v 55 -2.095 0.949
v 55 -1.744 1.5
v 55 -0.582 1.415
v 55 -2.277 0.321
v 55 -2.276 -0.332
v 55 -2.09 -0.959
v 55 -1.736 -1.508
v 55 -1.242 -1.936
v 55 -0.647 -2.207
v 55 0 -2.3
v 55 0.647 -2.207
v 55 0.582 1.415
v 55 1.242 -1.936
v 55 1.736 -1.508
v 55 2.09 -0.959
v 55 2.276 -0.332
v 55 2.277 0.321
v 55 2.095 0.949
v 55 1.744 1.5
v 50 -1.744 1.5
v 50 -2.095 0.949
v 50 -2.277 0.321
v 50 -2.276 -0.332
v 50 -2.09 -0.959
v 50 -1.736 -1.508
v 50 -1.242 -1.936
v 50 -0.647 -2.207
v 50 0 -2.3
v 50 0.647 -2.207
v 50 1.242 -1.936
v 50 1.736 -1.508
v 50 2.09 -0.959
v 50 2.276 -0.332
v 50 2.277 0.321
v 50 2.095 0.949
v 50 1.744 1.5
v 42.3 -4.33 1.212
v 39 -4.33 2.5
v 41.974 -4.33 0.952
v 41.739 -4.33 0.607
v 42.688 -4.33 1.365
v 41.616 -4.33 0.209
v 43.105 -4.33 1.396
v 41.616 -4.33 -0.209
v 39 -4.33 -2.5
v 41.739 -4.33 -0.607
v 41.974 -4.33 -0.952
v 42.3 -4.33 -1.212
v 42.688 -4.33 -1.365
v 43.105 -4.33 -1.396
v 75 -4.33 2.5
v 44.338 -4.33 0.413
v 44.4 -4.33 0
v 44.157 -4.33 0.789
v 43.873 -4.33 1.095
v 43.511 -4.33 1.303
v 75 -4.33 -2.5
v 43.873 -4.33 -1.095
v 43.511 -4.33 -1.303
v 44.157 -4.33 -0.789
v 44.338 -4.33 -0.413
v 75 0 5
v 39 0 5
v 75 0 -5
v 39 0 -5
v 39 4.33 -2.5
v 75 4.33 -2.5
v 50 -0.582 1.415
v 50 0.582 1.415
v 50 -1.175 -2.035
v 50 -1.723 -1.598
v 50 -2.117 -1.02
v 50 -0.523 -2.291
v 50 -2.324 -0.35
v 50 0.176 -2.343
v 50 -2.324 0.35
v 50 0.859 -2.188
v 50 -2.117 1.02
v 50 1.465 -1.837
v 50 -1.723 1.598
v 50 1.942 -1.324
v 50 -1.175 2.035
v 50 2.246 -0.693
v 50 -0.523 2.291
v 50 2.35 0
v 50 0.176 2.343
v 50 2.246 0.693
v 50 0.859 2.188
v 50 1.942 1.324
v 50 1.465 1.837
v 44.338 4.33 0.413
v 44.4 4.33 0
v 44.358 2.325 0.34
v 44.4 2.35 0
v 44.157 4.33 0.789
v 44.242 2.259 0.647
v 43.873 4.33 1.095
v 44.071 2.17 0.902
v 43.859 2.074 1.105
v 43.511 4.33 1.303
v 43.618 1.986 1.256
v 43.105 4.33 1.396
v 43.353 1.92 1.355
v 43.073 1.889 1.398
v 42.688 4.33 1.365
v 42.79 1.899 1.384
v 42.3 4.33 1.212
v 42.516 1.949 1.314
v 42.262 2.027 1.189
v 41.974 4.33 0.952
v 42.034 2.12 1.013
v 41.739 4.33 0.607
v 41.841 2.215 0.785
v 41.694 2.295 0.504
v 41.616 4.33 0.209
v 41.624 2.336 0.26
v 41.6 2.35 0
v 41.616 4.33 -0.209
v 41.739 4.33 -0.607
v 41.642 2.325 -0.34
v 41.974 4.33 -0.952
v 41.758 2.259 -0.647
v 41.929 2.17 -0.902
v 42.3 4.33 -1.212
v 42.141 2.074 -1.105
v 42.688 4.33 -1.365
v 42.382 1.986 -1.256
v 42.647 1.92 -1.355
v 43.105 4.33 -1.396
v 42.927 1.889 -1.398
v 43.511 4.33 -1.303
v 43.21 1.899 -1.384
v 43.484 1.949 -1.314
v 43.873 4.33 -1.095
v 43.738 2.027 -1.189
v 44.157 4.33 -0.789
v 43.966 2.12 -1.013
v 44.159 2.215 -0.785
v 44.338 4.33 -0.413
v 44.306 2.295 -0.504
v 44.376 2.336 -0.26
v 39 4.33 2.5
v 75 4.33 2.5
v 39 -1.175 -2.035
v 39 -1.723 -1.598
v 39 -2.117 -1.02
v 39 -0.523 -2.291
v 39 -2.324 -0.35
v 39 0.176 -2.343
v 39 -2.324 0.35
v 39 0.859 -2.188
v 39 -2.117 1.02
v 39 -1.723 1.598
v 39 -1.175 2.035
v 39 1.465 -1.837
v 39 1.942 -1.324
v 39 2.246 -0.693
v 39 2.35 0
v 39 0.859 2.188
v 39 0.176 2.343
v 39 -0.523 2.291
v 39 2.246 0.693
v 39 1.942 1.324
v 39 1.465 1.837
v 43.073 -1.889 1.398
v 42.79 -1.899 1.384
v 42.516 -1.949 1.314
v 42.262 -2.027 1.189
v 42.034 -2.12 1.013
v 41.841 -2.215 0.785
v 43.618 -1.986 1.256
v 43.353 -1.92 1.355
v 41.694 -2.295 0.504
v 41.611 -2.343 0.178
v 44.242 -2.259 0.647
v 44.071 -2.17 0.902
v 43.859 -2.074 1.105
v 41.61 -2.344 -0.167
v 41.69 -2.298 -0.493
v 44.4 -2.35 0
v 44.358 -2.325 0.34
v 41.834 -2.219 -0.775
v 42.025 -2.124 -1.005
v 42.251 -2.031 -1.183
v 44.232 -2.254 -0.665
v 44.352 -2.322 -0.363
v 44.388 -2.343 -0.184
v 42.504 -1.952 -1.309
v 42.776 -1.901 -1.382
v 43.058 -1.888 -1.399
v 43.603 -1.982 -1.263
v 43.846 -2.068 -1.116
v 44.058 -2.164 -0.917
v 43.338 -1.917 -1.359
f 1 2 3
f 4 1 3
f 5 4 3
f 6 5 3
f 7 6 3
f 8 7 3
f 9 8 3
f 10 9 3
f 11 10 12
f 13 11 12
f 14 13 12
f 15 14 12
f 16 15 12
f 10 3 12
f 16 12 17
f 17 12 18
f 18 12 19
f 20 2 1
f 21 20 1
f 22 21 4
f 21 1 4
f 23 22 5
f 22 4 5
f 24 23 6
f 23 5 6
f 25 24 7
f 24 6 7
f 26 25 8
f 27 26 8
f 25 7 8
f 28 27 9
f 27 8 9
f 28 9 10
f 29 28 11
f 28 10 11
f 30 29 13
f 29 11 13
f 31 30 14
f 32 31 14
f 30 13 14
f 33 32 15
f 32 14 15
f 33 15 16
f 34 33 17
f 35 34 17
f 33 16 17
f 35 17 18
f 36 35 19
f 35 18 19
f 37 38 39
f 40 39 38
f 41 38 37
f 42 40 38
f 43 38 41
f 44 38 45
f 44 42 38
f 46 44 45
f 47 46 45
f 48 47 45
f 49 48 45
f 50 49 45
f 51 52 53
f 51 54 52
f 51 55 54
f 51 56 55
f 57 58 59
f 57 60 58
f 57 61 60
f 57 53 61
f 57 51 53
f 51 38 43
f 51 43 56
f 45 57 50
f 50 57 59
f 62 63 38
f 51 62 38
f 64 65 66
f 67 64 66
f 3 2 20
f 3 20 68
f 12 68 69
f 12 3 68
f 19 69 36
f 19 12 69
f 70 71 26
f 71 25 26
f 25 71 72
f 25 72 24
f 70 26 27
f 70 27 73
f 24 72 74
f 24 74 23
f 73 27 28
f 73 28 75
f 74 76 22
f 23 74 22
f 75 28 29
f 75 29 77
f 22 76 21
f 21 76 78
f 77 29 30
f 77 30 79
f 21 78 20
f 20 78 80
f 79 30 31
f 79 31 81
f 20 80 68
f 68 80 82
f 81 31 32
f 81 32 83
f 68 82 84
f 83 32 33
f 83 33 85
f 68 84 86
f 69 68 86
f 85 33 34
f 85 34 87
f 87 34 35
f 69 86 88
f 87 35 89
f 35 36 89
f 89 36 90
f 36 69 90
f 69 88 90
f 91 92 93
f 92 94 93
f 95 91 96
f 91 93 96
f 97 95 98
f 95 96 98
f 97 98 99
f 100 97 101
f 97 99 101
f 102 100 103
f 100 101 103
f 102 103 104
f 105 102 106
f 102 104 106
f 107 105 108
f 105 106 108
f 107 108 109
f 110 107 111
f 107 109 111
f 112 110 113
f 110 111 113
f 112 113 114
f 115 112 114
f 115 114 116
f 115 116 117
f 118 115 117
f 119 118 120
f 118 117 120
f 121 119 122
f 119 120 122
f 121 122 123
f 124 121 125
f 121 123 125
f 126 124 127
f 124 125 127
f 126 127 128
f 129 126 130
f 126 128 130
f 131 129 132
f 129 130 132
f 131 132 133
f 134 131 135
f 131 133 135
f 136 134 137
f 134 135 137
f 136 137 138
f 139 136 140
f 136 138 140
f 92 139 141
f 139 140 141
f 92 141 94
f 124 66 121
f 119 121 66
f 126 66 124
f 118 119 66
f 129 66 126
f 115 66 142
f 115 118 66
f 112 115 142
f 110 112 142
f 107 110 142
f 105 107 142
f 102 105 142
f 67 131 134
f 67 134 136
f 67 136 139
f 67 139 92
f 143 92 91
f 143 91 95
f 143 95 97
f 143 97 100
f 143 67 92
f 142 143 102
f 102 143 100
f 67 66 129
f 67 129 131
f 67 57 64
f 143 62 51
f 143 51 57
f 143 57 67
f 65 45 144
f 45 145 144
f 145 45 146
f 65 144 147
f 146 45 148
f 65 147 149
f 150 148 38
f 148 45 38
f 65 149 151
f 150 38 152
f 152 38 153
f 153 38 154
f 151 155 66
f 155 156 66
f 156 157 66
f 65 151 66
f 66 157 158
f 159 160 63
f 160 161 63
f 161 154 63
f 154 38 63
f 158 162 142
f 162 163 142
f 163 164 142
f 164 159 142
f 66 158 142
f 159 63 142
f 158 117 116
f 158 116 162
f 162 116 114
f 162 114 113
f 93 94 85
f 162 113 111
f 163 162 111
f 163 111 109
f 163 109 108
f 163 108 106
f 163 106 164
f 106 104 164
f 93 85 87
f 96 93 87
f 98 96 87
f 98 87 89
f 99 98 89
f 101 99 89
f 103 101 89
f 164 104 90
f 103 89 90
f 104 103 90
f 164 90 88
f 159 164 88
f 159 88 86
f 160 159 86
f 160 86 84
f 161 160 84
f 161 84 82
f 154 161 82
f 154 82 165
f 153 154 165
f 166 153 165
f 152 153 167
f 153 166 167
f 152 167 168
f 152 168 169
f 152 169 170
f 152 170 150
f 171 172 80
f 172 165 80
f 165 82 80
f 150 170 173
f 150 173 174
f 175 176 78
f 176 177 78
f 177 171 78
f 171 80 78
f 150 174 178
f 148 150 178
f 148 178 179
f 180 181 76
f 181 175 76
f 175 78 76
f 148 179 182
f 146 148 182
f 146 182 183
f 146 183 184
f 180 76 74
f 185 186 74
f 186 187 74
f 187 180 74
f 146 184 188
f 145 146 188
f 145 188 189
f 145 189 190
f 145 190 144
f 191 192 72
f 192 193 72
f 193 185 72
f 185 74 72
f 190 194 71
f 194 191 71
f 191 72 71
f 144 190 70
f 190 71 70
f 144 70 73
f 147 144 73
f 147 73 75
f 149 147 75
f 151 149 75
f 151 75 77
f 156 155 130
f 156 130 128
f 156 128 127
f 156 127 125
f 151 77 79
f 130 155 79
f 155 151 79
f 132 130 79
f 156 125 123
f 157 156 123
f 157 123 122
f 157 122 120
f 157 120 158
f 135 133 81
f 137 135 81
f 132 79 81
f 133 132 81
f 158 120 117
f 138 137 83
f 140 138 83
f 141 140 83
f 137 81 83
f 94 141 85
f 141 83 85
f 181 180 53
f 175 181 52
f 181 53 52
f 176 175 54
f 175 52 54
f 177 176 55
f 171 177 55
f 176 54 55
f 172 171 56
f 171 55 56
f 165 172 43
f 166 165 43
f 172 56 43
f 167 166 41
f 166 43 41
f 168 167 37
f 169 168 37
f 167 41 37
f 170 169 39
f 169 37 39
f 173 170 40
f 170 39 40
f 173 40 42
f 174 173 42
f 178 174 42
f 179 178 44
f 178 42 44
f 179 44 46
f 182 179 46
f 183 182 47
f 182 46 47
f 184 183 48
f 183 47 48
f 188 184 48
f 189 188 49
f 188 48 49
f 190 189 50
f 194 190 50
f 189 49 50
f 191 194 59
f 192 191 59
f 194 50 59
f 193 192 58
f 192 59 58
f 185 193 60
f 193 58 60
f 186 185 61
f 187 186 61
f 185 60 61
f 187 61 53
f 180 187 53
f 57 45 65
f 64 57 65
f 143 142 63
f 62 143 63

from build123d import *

# Parameters (mm, degrees)
SKETCH205_R          = 1.4
PAD127041_DEPTH      = 10
SKETCH175_R          = 2.35
PAD127013_DEPTH      = 100
PAD127012_DEPTH      = 100
PAD127040_DEPTH      = 20
PAD127040_DEPTH_BACK = 16


with BuildPart() as setscrewcutout:
    # Sketch205 → Pad127041 (new body, symmetric)
    with BuildSketch(Plane(origin=(55, 0, 0), x_dir=(1, 0, 0), z_dir=(0, -1, 0))):
        with Locations((-12, 0)):
            Circle(SKETCH205_R)
    extrude(amount=PAD127041_DEPTH, both=True)


with BuildPart() as fullshaftcutout:
    # Sketch175 → Pad127013 (new body)
    with BuildSketch(Plane.YZ.offset(50)):
        Circle(SKETCH175_R)
    extrude(amount=-PAD127013_DEPTH)


with BuildPart() as axlecutout:
    # Sketch176 → Pad127012 (new body)
    with BuildSketch(Plane.YZ.offset(55)):
        with BuildLine():
            ThreePointArc((-1.74356, 1.5), (0, -2.3), (1.74356, 1.5))
            ThreePointArc((-1.74356, 1.5), (0, 1.404716), (1.74356, 1.5))
        make_face()
    extrude(amount=-PAD127012_DEPTH)

    # Fusion004020013: union FullShaftCutout
    add(fullshaftcutout.part)


with BuildPart() as adapteraxle:
    # Sketch204 → Pad127040 (new body, two sides)
    with BuildSketch(Plane.YZ.offset(55)) as pad127040_sk:
        Polygon((4.330127, 2.5), (0, 5), (-4.330127, 2.5), (-4.330127, -2.5), (0, -5), (4.330127, -2.5), align=None)
    extrude(amount=PAD127040_DEPTH)
    extrude(pad127040_sk.sketch, amount=-PAD127040_DEPTH_BACK)

    # Cut007019024: cut AxleCutout
    add(axlecutout.part, mode=Mode.SUBTRACT)

    # Cut007019025: cut SetScrewCutout
    add(setscrewcutout.part, mode=Mode.SUBTRACT)


solid = adapteraxle.part
